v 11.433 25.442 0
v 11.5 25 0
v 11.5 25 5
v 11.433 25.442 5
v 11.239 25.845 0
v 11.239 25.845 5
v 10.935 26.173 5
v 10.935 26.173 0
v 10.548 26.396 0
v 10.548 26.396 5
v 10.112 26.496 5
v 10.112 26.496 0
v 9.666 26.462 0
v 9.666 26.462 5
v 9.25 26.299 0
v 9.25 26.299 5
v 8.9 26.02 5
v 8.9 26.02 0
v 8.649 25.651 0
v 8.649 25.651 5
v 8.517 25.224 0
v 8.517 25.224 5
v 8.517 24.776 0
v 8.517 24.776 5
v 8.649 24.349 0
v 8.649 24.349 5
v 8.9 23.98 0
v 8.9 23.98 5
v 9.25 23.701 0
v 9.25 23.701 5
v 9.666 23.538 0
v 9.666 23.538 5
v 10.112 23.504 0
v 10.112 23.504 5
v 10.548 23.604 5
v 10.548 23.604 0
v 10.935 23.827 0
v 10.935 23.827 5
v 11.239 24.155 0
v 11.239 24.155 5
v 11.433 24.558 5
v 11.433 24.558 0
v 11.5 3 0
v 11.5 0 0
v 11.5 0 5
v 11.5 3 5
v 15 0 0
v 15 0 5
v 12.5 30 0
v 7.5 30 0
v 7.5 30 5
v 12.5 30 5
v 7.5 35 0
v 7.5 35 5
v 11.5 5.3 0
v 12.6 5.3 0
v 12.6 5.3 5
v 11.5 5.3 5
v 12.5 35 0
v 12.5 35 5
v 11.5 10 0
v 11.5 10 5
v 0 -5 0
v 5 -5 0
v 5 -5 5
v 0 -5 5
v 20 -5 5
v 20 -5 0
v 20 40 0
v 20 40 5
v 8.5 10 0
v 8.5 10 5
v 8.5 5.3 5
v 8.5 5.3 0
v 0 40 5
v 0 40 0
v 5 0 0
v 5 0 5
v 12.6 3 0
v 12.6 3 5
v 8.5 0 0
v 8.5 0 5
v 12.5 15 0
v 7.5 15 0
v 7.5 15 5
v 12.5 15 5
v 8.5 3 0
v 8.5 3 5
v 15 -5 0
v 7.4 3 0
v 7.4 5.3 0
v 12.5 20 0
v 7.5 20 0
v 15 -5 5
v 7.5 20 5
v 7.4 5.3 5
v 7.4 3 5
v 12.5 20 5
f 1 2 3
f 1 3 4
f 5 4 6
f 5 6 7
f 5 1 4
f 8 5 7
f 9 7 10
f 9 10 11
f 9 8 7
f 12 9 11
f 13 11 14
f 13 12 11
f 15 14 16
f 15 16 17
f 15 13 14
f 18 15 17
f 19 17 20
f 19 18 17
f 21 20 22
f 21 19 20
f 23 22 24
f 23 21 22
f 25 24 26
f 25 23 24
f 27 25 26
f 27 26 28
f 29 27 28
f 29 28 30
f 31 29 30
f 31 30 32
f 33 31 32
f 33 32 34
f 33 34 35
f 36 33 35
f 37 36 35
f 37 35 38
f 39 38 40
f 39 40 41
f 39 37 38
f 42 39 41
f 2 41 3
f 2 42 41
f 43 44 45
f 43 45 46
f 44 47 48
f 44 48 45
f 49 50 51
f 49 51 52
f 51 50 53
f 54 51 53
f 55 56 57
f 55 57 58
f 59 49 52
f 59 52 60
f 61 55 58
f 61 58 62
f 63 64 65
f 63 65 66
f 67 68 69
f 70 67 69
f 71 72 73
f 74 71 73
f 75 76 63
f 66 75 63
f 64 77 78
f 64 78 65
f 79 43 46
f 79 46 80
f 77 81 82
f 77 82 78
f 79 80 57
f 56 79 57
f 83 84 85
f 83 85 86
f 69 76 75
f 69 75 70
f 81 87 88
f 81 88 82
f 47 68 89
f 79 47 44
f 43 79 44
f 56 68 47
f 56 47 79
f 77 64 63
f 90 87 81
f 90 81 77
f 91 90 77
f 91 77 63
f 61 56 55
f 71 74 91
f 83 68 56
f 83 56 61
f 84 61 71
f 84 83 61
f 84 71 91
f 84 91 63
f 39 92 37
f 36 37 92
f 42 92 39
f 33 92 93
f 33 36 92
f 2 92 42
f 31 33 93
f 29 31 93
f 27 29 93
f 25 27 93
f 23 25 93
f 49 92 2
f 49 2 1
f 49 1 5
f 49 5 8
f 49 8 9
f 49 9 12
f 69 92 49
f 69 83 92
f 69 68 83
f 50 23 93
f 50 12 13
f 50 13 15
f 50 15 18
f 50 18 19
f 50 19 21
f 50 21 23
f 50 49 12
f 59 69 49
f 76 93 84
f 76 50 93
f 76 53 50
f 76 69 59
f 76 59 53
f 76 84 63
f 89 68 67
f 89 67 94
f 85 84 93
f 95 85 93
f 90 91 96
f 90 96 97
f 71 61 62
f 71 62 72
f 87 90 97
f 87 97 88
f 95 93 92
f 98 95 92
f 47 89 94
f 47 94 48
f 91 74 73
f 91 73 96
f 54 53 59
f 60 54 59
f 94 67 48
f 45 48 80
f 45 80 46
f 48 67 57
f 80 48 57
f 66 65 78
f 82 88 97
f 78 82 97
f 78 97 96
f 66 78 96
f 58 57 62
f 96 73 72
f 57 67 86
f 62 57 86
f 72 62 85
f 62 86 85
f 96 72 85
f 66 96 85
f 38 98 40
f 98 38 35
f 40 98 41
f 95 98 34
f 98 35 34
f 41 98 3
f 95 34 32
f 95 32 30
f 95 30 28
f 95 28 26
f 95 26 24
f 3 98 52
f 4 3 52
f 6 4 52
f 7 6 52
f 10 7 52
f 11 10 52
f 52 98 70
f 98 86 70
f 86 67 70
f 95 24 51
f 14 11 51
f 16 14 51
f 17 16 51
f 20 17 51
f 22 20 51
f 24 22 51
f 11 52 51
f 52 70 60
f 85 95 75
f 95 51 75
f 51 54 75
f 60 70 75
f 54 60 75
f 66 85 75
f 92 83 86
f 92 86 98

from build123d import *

# Parameters (mm, degrees)
SKETCH1_R           = 1.5
SKETCH1_W           = 5
SKETCH1_H           = 5
BOSS_EXTRUDE1_DEPTH = 5


with BuildPart() as part:
    # Sketch1 → Boss-Extrude1 (new body)
    with BuildSketch(Plane.XY):
        Polygon((0, 0), (0, 40), (20, 40), (20, 0), (20, -5), (15, -5), (15, 0), (11.5, 0), (11.5, 3), (12.6, 3), (12.6, 5.3), (11.5, 5.3), (11.5, 10), (8.5, 10), (8.5, 5.3), (7.4, 5.3), (7.4, 3), (8.5, 3), (8.5, 0), (5, 0), (5, -5), (0, -5), align=None)
        with Locations((10, 25)):
            Circle(SKETCH1_R, mode=Mode.SUBTRACT)
        with Locations((10, 17.5)):
            Rectangle(SKETCH1_W, SKETCH1_H, mode=Mode.SUBTRACT)
        with Locations((10, 32.5)):
            Rectangle(SKETCH1_W, SKETCH1_H, mode=Mode.SUBTRACT)
    extrude(amount=BOSS_EXTRUDE1_DEPTH)


solid = part.part
